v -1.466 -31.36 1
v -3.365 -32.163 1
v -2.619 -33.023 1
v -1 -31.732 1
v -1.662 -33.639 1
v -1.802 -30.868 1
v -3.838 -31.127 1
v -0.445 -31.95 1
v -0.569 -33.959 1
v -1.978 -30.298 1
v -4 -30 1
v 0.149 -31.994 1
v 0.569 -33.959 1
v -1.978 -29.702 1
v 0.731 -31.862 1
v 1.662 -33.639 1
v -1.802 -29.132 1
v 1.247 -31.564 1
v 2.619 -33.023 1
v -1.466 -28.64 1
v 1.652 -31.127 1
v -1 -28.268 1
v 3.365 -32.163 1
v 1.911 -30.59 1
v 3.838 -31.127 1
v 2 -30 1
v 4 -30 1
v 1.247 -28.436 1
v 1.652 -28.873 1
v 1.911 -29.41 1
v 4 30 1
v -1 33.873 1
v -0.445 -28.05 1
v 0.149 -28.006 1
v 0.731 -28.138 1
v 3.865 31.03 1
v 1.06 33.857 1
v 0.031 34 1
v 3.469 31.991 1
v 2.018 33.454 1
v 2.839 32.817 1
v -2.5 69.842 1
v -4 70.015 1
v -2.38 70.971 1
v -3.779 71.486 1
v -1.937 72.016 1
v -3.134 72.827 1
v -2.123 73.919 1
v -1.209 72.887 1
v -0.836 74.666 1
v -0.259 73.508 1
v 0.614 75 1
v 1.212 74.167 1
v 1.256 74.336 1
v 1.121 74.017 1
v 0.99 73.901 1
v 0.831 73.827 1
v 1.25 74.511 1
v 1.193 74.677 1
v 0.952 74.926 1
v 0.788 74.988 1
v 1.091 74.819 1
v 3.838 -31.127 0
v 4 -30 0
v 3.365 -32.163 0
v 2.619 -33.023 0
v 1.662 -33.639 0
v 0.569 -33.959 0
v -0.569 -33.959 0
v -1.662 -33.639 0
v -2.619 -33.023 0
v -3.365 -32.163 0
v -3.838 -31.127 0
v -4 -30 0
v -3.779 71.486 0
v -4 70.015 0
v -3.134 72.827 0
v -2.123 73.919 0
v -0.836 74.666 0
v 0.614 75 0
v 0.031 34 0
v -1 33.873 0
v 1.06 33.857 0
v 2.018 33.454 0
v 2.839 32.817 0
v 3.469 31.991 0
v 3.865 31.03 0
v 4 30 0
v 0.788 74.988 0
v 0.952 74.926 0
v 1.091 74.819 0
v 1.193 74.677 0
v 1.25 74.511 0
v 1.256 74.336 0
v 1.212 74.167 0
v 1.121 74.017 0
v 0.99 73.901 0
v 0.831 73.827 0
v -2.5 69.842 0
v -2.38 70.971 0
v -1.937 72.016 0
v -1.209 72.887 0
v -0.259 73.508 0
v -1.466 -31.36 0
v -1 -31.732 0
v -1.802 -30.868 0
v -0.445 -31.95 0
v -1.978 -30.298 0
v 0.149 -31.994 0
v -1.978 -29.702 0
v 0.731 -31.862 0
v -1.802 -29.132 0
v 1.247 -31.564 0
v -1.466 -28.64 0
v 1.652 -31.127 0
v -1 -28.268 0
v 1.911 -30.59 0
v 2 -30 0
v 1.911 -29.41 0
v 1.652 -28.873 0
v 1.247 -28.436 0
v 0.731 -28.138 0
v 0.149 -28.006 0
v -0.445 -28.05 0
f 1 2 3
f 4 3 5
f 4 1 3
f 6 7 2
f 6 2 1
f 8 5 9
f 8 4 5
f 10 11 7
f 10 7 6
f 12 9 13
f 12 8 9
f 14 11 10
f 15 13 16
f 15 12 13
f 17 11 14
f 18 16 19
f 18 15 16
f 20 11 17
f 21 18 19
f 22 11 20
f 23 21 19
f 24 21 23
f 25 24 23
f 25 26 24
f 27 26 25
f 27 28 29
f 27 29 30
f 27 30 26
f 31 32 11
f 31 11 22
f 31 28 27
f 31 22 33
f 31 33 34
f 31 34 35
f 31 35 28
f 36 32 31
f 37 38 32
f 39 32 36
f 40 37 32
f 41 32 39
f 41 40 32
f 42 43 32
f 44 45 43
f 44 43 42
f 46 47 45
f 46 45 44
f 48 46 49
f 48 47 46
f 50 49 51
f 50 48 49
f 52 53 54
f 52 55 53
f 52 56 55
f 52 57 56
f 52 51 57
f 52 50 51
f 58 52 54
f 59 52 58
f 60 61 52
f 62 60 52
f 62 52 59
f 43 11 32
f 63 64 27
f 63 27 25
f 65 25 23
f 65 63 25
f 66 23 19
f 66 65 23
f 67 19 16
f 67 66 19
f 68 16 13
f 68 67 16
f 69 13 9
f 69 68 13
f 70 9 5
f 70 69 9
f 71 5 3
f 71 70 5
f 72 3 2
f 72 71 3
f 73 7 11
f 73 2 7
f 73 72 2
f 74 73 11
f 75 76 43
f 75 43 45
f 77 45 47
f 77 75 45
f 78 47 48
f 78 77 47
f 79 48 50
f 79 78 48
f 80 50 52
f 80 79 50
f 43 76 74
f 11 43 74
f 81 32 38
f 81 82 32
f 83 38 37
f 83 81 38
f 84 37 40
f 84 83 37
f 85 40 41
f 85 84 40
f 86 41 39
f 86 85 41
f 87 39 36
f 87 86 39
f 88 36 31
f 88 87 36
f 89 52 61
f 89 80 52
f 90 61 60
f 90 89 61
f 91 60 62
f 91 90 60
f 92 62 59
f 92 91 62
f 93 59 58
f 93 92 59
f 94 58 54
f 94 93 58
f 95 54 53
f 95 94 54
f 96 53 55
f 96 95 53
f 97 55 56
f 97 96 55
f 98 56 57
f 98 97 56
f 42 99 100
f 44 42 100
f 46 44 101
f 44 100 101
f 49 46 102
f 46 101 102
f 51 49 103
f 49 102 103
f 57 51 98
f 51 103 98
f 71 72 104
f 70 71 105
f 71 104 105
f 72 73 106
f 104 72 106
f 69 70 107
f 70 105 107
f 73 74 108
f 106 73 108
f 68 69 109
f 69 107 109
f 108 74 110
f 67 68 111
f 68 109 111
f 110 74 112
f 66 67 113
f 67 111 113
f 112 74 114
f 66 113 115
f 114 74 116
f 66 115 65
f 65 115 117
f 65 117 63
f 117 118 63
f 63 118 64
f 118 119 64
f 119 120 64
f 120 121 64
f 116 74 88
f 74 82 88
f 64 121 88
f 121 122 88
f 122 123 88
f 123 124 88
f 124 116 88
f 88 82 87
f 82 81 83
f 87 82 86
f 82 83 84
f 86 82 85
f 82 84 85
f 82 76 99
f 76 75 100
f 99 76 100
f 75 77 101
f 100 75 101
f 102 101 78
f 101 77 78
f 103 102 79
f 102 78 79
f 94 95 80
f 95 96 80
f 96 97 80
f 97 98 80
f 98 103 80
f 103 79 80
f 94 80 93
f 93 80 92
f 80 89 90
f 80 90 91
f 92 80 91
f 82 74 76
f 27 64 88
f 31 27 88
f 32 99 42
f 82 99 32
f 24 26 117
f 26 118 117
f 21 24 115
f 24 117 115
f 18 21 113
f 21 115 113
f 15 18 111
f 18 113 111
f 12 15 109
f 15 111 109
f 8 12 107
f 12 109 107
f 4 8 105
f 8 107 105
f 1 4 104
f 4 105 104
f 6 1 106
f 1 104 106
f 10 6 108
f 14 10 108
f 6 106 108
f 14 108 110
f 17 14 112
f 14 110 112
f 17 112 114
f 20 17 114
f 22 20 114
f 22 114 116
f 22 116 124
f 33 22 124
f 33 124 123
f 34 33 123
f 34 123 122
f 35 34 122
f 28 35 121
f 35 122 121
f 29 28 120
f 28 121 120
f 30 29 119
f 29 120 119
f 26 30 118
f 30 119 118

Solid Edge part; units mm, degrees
sketch "Sketch1" plane through (0, 0, 0) normal (0, 0, 1) x (1, 0, 0)
  line L0 (4, -30) -> (4, 30)
  arc A0 (4, 30) -> (-1, 33.873) centre (0, 30) ccw
  line L1 (-2.5, 69.8417) -> (-1, 33.873)
  arc A1 (-2.5, 69.8417) -> (0.8311, 73.8267) centre (1.3567, 70.0026) cw
  arc A2 (0.6137, 75) -> (0.8311, 73.8267) centre (0.66, 74.4018) cw
  arc A3 (-4, 70.0149) -> (0.6137, 75) centre (1, 70.0149) cw
  line L2 (-4, 30) -> (-4, 70.0149)
  line L3 (-4, 30) -> (-4, -30)
  arc A4 (-4, -30) -> (4, -30) centre (0, -30) ccw
  dimension "D1" = 4
  dimension "D2" = 2.5
  dimension "D3" = 2.5
extrude "Ajout_matière_1" add sketch "Sketch1" along normal blind 1
sketch "Sketch2" plane through (0, 0, 0) normal (0, 0, 1) x (1, 0, 0)
  circle A0 centre (0, -30) radius 2
  dimension "D1" = 4
extrude "Cutout1" cut sketch "Sketch2" along normal up to next
properties material "Acier S235"
